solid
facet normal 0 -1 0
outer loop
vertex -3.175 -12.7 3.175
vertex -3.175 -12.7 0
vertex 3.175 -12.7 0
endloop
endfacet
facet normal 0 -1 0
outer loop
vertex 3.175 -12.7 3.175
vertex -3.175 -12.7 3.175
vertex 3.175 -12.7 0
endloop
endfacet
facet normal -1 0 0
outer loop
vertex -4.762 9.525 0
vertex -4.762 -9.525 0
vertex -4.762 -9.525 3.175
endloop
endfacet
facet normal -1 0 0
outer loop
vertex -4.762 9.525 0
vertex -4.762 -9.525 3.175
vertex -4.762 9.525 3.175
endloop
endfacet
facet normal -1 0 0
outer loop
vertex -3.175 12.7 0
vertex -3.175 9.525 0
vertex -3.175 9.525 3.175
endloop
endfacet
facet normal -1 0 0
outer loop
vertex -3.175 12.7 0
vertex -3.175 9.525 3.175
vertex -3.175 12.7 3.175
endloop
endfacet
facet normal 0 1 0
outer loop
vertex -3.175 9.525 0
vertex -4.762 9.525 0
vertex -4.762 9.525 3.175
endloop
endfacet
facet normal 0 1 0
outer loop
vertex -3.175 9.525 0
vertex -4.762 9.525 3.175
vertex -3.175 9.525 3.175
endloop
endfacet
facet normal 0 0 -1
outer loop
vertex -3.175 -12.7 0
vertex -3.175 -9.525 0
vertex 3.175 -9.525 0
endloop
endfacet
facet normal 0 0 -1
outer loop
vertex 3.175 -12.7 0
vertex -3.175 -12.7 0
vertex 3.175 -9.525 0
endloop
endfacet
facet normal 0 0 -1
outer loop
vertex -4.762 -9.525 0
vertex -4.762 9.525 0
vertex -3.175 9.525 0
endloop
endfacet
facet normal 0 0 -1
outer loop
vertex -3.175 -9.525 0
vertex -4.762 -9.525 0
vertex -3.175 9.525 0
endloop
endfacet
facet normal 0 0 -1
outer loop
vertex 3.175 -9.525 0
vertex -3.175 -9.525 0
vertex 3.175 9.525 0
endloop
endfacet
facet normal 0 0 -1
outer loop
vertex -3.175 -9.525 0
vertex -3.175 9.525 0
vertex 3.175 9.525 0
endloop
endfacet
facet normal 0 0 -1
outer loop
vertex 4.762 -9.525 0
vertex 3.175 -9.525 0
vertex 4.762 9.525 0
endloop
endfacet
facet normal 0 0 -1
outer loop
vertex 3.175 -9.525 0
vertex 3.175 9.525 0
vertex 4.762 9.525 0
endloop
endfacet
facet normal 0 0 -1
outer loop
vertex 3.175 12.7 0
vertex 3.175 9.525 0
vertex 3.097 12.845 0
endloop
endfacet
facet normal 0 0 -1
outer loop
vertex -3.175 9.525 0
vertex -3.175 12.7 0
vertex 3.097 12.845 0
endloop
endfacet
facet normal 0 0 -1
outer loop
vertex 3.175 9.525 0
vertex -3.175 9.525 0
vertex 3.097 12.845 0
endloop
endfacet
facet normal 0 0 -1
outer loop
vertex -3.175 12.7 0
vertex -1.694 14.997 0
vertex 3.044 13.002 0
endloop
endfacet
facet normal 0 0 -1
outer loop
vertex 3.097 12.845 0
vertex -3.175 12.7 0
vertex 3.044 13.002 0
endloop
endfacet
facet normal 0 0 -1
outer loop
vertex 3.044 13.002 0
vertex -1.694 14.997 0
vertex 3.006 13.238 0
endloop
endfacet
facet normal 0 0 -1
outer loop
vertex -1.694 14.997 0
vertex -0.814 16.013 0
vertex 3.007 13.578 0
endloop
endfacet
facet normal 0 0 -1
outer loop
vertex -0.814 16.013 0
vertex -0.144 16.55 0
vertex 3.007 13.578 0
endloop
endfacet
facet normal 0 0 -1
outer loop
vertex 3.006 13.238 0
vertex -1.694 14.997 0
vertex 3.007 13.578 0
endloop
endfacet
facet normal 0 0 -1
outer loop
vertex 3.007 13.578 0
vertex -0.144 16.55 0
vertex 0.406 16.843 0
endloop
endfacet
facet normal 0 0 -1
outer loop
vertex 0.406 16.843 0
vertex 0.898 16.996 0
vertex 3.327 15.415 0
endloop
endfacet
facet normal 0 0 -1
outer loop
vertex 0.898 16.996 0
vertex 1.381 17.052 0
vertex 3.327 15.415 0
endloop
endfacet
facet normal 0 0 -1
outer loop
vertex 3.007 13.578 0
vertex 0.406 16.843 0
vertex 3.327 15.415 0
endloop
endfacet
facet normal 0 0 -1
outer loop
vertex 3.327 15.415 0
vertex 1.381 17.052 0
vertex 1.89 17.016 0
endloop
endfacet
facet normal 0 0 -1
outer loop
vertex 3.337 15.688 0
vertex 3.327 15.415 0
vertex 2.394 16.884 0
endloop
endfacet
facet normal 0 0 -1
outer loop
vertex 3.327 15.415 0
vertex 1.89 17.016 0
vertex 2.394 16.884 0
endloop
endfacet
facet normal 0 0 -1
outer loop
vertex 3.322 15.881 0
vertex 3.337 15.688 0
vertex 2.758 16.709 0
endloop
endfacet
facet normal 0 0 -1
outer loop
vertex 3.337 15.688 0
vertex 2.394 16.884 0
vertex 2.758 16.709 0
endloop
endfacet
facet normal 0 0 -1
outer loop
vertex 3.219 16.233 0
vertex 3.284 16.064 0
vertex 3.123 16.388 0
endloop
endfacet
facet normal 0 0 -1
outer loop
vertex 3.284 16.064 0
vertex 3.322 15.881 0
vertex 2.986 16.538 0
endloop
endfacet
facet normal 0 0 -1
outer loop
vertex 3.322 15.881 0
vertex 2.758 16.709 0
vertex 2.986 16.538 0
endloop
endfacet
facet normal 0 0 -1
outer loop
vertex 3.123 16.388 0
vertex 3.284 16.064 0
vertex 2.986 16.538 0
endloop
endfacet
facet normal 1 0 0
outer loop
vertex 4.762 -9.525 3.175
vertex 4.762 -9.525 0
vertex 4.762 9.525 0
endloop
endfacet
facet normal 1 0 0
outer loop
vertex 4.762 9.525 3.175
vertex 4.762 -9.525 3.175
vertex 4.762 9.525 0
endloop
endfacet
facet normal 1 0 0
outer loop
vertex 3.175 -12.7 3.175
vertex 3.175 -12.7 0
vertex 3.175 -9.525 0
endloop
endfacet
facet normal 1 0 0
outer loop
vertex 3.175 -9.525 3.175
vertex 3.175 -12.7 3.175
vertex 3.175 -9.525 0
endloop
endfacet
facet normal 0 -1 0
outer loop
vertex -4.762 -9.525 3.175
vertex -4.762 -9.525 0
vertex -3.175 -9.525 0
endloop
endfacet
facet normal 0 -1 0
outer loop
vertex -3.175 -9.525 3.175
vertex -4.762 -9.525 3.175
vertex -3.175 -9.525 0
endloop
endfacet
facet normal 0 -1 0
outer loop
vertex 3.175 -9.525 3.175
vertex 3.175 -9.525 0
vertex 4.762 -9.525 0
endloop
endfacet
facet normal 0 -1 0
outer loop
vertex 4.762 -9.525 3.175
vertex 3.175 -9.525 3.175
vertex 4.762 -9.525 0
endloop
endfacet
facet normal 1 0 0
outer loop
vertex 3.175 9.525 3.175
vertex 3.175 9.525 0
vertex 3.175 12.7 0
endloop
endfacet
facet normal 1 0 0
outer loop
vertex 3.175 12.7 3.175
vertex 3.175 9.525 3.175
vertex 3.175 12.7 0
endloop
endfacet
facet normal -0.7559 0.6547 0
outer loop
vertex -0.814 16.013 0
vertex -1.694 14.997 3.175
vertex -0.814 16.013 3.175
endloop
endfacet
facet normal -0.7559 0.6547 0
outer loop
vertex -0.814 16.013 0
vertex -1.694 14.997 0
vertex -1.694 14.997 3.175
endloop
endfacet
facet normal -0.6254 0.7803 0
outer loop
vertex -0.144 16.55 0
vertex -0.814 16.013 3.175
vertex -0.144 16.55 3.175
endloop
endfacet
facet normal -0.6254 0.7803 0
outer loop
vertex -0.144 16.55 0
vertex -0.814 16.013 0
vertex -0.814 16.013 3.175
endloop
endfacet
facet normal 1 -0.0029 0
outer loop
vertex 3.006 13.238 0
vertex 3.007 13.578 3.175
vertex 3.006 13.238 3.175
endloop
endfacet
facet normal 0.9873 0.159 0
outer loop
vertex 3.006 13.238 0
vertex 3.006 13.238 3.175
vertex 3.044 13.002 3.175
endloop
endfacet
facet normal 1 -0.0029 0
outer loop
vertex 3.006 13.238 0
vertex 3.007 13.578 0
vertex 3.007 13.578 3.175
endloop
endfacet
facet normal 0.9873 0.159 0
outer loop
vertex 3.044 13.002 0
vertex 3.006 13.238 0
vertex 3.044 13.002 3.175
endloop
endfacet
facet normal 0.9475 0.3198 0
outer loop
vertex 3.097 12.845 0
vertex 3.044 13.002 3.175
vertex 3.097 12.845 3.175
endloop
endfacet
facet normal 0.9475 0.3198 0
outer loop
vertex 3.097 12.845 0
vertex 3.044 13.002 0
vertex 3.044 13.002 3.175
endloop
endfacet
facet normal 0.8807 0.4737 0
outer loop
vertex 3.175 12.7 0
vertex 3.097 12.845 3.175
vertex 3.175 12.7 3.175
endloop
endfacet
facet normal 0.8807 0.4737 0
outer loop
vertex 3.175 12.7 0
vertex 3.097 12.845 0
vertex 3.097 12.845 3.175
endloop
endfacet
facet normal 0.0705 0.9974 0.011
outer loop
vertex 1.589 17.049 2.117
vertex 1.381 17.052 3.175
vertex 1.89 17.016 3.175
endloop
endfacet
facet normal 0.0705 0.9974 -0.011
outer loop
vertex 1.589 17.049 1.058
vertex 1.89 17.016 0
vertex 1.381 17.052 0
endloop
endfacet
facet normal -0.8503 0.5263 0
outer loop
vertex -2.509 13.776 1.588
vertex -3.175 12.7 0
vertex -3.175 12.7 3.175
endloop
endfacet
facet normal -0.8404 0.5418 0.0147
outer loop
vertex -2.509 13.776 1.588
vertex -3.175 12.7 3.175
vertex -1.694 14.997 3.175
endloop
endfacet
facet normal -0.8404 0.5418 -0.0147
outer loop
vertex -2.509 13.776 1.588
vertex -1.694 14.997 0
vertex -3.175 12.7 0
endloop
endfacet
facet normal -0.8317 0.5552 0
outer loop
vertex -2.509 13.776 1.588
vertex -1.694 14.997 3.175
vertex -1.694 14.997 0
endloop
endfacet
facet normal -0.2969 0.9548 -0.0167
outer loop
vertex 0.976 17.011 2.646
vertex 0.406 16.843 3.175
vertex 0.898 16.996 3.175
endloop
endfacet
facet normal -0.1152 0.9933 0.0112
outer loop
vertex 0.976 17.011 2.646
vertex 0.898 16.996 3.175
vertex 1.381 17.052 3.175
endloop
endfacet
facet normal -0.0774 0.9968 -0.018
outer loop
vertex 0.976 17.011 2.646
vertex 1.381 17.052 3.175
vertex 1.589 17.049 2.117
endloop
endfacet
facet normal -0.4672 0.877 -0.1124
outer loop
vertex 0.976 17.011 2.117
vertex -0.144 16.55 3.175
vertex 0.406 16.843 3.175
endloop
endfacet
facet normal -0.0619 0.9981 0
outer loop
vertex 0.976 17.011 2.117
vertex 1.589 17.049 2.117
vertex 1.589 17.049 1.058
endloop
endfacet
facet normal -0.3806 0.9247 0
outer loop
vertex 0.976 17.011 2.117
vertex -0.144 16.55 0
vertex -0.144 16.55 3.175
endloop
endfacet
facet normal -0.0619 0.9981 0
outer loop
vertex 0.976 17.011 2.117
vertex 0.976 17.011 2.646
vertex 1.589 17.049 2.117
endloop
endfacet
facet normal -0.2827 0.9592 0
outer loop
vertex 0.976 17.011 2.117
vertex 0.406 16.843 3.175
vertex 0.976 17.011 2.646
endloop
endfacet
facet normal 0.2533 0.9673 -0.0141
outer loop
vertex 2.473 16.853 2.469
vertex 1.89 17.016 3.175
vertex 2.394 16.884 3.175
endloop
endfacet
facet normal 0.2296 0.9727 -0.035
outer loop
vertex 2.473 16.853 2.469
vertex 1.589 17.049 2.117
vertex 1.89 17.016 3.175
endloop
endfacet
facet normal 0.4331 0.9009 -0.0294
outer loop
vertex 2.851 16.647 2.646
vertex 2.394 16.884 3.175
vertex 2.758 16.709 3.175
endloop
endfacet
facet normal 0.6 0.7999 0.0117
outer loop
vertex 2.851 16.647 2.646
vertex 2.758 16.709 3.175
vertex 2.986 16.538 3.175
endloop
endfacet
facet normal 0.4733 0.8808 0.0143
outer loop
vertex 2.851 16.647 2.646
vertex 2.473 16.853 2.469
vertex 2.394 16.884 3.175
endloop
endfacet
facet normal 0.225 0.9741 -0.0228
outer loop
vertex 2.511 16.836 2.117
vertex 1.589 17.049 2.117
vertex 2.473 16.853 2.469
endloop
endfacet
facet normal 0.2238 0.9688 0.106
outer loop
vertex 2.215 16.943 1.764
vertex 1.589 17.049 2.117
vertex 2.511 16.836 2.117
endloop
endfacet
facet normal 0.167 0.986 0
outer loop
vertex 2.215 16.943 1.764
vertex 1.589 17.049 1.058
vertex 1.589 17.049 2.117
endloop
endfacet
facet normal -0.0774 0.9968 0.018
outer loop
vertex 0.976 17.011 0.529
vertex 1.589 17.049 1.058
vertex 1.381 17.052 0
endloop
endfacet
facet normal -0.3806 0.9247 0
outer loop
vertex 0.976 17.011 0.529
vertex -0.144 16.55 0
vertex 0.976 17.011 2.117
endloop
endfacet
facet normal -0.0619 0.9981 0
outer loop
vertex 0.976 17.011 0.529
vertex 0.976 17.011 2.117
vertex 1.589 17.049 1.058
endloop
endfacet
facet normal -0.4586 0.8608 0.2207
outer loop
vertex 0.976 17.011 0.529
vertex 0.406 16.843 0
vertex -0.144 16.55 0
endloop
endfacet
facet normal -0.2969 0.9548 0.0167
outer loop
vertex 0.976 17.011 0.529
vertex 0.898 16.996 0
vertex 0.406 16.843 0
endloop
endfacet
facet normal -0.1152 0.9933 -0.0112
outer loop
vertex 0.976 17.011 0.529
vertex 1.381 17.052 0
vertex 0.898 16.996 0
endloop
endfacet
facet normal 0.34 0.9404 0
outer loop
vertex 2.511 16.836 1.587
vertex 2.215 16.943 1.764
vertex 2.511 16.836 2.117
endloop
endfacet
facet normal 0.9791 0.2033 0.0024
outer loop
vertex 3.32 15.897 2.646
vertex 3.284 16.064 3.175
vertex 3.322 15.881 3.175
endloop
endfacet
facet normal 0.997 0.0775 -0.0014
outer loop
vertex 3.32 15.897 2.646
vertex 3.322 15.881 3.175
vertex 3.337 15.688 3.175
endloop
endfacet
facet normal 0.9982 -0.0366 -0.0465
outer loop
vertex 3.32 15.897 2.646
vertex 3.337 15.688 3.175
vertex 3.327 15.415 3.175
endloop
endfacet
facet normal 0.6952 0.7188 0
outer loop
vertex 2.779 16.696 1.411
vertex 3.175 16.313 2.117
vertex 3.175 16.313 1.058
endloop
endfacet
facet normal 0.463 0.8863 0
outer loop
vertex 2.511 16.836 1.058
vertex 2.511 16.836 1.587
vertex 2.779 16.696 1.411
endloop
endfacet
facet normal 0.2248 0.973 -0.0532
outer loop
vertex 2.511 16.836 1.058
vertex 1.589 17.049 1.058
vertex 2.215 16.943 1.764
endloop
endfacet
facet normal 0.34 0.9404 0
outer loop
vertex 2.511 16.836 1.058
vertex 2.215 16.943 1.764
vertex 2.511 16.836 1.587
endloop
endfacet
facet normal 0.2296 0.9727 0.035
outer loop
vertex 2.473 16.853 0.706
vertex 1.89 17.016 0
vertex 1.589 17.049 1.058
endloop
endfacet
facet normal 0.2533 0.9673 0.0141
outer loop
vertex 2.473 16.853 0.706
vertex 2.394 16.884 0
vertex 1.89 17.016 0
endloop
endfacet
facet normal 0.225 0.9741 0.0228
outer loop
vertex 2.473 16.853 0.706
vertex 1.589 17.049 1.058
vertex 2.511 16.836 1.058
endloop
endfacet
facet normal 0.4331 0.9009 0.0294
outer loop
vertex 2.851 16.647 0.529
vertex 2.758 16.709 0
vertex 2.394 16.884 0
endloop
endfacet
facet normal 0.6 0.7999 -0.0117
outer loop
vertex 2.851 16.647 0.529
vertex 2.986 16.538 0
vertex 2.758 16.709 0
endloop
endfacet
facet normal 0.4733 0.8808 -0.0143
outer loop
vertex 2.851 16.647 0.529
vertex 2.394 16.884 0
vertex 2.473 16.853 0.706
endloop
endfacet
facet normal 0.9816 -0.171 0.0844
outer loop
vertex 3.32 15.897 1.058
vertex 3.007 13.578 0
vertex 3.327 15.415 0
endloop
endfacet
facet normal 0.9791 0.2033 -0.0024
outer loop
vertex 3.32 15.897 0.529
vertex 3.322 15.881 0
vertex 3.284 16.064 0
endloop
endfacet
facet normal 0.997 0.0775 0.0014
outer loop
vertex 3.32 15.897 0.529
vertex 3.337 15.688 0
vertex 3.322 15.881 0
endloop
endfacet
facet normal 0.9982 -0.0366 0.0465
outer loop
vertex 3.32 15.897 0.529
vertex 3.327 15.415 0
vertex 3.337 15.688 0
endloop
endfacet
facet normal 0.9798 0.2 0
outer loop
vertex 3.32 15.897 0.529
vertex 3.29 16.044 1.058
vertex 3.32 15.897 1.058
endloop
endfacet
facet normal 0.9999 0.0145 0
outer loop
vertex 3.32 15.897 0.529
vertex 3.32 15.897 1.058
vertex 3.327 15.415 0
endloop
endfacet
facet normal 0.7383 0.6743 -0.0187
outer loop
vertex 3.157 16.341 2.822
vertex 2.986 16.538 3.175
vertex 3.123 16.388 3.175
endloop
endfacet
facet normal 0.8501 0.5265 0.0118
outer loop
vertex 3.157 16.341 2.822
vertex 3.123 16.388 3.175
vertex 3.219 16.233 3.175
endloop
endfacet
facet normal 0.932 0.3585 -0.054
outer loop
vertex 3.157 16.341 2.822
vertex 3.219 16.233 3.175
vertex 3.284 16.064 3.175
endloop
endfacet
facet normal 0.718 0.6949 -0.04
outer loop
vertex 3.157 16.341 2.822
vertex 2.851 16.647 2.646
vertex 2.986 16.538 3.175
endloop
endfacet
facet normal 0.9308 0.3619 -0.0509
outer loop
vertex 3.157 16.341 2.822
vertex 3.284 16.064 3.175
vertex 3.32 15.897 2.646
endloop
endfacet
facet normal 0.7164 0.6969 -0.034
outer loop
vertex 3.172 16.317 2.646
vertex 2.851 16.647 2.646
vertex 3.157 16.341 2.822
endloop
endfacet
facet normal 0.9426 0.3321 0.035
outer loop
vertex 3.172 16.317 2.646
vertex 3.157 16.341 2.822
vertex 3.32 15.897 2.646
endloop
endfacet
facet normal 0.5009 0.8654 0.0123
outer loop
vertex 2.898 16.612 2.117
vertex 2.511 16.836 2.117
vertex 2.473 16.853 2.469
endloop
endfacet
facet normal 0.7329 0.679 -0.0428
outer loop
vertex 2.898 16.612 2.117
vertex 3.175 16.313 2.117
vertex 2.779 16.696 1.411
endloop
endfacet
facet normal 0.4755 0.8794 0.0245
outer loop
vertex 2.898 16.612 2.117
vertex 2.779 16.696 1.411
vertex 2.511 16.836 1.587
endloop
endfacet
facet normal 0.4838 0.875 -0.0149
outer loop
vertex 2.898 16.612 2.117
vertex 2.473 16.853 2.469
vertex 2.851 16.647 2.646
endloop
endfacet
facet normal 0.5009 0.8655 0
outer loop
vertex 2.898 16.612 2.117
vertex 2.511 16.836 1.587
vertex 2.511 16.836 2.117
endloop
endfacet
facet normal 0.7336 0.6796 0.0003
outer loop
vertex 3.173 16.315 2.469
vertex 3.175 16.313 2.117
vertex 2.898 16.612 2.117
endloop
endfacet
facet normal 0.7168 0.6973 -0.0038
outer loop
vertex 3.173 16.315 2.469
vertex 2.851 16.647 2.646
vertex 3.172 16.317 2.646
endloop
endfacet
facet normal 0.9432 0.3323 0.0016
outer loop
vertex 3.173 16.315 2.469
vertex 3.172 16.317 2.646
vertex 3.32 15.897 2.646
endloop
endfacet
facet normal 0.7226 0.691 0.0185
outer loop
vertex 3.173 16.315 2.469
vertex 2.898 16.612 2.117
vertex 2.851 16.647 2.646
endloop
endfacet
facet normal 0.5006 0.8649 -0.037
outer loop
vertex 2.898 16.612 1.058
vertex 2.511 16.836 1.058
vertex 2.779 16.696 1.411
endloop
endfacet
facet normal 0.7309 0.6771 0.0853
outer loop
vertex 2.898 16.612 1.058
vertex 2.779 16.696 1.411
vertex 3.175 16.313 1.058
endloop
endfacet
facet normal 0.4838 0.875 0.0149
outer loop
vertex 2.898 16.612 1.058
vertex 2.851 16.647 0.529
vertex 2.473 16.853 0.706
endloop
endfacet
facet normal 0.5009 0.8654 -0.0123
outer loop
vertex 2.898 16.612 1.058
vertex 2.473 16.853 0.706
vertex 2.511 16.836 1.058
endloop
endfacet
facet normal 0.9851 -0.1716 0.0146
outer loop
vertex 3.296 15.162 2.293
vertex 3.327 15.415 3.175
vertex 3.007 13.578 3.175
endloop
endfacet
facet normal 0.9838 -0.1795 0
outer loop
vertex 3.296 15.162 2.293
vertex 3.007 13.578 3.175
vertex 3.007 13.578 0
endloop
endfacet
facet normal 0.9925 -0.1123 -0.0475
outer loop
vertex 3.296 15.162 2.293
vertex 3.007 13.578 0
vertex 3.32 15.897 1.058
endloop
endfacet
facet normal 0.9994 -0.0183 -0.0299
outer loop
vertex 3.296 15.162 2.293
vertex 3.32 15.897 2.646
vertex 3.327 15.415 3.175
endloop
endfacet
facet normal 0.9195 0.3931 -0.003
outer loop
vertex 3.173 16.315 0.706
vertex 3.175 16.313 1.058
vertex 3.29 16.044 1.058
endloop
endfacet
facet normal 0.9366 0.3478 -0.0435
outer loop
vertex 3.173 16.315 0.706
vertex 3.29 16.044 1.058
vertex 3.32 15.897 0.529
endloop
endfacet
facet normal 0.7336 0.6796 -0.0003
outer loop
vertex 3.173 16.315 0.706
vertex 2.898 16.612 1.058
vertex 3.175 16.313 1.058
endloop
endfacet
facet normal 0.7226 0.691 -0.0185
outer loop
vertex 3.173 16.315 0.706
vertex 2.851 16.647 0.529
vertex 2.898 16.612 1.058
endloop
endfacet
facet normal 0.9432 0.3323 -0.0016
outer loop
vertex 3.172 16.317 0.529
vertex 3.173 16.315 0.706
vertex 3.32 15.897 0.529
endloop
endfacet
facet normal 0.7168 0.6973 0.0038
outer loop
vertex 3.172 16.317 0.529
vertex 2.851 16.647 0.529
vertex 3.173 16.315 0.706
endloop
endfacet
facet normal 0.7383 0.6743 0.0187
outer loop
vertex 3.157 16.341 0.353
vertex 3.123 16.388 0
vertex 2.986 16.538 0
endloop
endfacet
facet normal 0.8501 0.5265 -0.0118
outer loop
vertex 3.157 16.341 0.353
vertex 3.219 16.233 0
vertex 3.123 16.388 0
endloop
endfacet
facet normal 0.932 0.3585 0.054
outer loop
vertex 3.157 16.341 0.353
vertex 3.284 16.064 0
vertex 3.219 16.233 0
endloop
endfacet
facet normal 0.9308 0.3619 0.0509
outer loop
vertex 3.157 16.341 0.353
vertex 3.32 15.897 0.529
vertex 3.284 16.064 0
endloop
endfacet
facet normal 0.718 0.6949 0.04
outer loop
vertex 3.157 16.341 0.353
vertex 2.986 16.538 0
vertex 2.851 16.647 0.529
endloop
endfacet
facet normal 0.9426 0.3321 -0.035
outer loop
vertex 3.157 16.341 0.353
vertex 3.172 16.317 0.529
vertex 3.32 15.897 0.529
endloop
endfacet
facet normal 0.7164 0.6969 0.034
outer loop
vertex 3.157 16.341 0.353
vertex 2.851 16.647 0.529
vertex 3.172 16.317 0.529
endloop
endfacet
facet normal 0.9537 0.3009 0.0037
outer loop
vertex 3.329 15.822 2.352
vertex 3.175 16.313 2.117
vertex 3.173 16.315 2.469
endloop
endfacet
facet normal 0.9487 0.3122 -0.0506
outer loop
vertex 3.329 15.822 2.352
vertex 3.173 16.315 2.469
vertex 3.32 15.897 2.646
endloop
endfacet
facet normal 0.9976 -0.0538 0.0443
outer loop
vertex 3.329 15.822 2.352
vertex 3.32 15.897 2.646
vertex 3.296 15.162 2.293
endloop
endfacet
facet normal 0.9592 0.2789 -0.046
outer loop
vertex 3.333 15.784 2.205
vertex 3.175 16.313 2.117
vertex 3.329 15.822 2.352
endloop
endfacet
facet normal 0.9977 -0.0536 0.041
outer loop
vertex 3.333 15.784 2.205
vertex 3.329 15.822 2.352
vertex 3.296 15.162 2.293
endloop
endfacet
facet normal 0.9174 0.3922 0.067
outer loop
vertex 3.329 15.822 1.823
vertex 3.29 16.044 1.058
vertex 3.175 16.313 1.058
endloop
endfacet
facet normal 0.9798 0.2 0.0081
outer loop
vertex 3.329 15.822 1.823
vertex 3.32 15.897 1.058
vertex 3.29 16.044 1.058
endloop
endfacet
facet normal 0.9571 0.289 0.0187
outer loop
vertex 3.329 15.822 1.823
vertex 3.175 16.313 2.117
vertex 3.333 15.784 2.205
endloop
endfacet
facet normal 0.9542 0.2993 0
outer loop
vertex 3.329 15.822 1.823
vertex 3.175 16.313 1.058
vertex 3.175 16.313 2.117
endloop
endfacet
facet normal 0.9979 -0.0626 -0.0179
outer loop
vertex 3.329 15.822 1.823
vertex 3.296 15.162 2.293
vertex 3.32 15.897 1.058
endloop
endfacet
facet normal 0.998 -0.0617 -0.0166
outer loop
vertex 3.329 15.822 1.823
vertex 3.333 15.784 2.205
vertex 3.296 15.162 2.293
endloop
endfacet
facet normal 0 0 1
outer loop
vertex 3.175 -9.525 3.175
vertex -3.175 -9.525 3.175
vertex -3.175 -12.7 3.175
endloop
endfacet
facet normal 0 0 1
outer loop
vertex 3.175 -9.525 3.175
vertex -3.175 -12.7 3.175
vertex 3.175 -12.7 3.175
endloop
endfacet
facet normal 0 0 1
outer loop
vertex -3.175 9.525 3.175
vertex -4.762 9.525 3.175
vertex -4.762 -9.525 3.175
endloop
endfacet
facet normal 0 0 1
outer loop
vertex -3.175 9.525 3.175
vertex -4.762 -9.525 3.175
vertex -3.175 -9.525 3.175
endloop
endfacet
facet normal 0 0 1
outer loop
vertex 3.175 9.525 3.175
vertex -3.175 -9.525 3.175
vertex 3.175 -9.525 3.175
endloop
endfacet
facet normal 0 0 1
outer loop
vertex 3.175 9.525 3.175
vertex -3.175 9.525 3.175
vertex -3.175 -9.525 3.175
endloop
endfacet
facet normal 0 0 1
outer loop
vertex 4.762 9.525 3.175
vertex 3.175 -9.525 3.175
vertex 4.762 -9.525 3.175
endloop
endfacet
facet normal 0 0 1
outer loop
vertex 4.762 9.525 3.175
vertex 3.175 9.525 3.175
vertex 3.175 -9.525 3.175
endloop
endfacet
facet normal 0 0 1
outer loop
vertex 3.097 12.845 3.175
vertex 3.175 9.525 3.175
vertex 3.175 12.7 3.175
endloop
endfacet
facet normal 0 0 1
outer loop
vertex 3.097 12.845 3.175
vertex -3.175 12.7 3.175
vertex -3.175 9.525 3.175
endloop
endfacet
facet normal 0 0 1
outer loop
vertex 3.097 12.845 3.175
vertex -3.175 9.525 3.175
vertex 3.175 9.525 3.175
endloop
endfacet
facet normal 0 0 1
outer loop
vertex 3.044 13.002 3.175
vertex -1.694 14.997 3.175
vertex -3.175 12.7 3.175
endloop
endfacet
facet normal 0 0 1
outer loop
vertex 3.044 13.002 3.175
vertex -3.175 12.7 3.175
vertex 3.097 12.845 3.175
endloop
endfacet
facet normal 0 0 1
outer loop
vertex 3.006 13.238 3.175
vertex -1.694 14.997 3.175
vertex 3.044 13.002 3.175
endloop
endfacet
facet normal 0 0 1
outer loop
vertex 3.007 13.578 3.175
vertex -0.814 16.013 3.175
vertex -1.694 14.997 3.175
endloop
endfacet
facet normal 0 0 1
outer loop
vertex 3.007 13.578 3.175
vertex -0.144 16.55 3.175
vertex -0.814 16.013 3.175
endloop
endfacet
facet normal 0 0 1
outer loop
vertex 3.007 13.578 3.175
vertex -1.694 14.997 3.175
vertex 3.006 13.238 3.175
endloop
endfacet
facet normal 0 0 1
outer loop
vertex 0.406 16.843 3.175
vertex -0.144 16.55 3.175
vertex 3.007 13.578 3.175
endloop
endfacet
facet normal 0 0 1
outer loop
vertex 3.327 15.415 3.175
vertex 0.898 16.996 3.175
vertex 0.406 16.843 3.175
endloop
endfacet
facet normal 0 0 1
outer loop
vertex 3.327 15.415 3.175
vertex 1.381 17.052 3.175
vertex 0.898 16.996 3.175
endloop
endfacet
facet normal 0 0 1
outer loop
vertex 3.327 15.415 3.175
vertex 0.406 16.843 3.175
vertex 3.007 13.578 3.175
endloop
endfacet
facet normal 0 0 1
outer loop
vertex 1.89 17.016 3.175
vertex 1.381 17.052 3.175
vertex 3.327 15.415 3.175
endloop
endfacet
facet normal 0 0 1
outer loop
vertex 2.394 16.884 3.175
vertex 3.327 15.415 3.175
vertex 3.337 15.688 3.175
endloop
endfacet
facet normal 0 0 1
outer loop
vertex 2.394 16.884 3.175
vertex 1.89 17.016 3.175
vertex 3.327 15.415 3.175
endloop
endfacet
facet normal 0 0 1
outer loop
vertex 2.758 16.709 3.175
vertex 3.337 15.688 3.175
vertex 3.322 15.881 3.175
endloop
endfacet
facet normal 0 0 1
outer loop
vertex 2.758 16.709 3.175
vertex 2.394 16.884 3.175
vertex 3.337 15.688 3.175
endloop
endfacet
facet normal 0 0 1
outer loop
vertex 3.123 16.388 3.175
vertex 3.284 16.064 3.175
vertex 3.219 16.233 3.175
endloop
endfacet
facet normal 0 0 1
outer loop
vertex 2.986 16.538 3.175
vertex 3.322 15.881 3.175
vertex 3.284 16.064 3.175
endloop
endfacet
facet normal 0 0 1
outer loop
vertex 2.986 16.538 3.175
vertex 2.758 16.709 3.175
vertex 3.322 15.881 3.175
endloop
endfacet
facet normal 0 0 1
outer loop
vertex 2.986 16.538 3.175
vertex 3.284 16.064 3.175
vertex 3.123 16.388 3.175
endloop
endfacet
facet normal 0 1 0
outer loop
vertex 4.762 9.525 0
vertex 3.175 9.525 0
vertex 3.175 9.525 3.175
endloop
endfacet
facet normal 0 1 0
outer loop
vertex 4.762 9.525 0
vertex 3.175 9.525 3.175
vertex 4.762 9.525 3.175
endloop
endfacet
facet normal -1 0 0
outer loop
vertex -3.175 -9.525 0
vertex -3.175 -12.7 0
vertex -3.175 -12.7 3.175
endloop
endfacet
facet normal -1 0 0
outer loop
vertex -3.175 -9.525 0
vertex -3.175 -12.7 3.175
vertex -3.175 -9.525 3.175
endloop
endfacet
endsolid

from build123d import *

# Parameters (mm, degrees)
SKETCH1_W           = 9.525
SKETCH1_H           = 19.05
SKETCH1_W_2         = 6.35
SKETCH1_H_2         = 3.175
BOSS_EXTRUDE1_DEPTH = 3.175


with BuildPart() as part:
    # Sketch1 → Boss-Extrude1 (new body)
    with BuildSketch(Plane.XY):
        Rectangle(SKETCH1_W, SKETCH1_H)
        with Locations((0, 11.1125)):
            Rectangle(SKETCH1_W_2, SKETCH1_H_2)
        with BuildLine():
            add(Edge.make_bspline(
                [(-3.175, 12.7), (-2.213811761, 14.173592311), (-0.385937212, 17.971687726), (4.31508926, 16.239746311), (2.576510016, 13.616240346), (3.175, 12.7)],
                knots=[0, 0, 0, 0, 0.552544755, 0.69848067, 1, 1, 1, 1], degree=3))
            Line((3.175, 12.7), (-3.175, 12.7))
        make_face()
        with Locations((0, -11.1125)):
            Rectangle(SKETCH1_W_2, SKETCH1_H_2)
    extrude(amount=BOSS_EXTRUDE1_DEPTH)


solid = part.part
